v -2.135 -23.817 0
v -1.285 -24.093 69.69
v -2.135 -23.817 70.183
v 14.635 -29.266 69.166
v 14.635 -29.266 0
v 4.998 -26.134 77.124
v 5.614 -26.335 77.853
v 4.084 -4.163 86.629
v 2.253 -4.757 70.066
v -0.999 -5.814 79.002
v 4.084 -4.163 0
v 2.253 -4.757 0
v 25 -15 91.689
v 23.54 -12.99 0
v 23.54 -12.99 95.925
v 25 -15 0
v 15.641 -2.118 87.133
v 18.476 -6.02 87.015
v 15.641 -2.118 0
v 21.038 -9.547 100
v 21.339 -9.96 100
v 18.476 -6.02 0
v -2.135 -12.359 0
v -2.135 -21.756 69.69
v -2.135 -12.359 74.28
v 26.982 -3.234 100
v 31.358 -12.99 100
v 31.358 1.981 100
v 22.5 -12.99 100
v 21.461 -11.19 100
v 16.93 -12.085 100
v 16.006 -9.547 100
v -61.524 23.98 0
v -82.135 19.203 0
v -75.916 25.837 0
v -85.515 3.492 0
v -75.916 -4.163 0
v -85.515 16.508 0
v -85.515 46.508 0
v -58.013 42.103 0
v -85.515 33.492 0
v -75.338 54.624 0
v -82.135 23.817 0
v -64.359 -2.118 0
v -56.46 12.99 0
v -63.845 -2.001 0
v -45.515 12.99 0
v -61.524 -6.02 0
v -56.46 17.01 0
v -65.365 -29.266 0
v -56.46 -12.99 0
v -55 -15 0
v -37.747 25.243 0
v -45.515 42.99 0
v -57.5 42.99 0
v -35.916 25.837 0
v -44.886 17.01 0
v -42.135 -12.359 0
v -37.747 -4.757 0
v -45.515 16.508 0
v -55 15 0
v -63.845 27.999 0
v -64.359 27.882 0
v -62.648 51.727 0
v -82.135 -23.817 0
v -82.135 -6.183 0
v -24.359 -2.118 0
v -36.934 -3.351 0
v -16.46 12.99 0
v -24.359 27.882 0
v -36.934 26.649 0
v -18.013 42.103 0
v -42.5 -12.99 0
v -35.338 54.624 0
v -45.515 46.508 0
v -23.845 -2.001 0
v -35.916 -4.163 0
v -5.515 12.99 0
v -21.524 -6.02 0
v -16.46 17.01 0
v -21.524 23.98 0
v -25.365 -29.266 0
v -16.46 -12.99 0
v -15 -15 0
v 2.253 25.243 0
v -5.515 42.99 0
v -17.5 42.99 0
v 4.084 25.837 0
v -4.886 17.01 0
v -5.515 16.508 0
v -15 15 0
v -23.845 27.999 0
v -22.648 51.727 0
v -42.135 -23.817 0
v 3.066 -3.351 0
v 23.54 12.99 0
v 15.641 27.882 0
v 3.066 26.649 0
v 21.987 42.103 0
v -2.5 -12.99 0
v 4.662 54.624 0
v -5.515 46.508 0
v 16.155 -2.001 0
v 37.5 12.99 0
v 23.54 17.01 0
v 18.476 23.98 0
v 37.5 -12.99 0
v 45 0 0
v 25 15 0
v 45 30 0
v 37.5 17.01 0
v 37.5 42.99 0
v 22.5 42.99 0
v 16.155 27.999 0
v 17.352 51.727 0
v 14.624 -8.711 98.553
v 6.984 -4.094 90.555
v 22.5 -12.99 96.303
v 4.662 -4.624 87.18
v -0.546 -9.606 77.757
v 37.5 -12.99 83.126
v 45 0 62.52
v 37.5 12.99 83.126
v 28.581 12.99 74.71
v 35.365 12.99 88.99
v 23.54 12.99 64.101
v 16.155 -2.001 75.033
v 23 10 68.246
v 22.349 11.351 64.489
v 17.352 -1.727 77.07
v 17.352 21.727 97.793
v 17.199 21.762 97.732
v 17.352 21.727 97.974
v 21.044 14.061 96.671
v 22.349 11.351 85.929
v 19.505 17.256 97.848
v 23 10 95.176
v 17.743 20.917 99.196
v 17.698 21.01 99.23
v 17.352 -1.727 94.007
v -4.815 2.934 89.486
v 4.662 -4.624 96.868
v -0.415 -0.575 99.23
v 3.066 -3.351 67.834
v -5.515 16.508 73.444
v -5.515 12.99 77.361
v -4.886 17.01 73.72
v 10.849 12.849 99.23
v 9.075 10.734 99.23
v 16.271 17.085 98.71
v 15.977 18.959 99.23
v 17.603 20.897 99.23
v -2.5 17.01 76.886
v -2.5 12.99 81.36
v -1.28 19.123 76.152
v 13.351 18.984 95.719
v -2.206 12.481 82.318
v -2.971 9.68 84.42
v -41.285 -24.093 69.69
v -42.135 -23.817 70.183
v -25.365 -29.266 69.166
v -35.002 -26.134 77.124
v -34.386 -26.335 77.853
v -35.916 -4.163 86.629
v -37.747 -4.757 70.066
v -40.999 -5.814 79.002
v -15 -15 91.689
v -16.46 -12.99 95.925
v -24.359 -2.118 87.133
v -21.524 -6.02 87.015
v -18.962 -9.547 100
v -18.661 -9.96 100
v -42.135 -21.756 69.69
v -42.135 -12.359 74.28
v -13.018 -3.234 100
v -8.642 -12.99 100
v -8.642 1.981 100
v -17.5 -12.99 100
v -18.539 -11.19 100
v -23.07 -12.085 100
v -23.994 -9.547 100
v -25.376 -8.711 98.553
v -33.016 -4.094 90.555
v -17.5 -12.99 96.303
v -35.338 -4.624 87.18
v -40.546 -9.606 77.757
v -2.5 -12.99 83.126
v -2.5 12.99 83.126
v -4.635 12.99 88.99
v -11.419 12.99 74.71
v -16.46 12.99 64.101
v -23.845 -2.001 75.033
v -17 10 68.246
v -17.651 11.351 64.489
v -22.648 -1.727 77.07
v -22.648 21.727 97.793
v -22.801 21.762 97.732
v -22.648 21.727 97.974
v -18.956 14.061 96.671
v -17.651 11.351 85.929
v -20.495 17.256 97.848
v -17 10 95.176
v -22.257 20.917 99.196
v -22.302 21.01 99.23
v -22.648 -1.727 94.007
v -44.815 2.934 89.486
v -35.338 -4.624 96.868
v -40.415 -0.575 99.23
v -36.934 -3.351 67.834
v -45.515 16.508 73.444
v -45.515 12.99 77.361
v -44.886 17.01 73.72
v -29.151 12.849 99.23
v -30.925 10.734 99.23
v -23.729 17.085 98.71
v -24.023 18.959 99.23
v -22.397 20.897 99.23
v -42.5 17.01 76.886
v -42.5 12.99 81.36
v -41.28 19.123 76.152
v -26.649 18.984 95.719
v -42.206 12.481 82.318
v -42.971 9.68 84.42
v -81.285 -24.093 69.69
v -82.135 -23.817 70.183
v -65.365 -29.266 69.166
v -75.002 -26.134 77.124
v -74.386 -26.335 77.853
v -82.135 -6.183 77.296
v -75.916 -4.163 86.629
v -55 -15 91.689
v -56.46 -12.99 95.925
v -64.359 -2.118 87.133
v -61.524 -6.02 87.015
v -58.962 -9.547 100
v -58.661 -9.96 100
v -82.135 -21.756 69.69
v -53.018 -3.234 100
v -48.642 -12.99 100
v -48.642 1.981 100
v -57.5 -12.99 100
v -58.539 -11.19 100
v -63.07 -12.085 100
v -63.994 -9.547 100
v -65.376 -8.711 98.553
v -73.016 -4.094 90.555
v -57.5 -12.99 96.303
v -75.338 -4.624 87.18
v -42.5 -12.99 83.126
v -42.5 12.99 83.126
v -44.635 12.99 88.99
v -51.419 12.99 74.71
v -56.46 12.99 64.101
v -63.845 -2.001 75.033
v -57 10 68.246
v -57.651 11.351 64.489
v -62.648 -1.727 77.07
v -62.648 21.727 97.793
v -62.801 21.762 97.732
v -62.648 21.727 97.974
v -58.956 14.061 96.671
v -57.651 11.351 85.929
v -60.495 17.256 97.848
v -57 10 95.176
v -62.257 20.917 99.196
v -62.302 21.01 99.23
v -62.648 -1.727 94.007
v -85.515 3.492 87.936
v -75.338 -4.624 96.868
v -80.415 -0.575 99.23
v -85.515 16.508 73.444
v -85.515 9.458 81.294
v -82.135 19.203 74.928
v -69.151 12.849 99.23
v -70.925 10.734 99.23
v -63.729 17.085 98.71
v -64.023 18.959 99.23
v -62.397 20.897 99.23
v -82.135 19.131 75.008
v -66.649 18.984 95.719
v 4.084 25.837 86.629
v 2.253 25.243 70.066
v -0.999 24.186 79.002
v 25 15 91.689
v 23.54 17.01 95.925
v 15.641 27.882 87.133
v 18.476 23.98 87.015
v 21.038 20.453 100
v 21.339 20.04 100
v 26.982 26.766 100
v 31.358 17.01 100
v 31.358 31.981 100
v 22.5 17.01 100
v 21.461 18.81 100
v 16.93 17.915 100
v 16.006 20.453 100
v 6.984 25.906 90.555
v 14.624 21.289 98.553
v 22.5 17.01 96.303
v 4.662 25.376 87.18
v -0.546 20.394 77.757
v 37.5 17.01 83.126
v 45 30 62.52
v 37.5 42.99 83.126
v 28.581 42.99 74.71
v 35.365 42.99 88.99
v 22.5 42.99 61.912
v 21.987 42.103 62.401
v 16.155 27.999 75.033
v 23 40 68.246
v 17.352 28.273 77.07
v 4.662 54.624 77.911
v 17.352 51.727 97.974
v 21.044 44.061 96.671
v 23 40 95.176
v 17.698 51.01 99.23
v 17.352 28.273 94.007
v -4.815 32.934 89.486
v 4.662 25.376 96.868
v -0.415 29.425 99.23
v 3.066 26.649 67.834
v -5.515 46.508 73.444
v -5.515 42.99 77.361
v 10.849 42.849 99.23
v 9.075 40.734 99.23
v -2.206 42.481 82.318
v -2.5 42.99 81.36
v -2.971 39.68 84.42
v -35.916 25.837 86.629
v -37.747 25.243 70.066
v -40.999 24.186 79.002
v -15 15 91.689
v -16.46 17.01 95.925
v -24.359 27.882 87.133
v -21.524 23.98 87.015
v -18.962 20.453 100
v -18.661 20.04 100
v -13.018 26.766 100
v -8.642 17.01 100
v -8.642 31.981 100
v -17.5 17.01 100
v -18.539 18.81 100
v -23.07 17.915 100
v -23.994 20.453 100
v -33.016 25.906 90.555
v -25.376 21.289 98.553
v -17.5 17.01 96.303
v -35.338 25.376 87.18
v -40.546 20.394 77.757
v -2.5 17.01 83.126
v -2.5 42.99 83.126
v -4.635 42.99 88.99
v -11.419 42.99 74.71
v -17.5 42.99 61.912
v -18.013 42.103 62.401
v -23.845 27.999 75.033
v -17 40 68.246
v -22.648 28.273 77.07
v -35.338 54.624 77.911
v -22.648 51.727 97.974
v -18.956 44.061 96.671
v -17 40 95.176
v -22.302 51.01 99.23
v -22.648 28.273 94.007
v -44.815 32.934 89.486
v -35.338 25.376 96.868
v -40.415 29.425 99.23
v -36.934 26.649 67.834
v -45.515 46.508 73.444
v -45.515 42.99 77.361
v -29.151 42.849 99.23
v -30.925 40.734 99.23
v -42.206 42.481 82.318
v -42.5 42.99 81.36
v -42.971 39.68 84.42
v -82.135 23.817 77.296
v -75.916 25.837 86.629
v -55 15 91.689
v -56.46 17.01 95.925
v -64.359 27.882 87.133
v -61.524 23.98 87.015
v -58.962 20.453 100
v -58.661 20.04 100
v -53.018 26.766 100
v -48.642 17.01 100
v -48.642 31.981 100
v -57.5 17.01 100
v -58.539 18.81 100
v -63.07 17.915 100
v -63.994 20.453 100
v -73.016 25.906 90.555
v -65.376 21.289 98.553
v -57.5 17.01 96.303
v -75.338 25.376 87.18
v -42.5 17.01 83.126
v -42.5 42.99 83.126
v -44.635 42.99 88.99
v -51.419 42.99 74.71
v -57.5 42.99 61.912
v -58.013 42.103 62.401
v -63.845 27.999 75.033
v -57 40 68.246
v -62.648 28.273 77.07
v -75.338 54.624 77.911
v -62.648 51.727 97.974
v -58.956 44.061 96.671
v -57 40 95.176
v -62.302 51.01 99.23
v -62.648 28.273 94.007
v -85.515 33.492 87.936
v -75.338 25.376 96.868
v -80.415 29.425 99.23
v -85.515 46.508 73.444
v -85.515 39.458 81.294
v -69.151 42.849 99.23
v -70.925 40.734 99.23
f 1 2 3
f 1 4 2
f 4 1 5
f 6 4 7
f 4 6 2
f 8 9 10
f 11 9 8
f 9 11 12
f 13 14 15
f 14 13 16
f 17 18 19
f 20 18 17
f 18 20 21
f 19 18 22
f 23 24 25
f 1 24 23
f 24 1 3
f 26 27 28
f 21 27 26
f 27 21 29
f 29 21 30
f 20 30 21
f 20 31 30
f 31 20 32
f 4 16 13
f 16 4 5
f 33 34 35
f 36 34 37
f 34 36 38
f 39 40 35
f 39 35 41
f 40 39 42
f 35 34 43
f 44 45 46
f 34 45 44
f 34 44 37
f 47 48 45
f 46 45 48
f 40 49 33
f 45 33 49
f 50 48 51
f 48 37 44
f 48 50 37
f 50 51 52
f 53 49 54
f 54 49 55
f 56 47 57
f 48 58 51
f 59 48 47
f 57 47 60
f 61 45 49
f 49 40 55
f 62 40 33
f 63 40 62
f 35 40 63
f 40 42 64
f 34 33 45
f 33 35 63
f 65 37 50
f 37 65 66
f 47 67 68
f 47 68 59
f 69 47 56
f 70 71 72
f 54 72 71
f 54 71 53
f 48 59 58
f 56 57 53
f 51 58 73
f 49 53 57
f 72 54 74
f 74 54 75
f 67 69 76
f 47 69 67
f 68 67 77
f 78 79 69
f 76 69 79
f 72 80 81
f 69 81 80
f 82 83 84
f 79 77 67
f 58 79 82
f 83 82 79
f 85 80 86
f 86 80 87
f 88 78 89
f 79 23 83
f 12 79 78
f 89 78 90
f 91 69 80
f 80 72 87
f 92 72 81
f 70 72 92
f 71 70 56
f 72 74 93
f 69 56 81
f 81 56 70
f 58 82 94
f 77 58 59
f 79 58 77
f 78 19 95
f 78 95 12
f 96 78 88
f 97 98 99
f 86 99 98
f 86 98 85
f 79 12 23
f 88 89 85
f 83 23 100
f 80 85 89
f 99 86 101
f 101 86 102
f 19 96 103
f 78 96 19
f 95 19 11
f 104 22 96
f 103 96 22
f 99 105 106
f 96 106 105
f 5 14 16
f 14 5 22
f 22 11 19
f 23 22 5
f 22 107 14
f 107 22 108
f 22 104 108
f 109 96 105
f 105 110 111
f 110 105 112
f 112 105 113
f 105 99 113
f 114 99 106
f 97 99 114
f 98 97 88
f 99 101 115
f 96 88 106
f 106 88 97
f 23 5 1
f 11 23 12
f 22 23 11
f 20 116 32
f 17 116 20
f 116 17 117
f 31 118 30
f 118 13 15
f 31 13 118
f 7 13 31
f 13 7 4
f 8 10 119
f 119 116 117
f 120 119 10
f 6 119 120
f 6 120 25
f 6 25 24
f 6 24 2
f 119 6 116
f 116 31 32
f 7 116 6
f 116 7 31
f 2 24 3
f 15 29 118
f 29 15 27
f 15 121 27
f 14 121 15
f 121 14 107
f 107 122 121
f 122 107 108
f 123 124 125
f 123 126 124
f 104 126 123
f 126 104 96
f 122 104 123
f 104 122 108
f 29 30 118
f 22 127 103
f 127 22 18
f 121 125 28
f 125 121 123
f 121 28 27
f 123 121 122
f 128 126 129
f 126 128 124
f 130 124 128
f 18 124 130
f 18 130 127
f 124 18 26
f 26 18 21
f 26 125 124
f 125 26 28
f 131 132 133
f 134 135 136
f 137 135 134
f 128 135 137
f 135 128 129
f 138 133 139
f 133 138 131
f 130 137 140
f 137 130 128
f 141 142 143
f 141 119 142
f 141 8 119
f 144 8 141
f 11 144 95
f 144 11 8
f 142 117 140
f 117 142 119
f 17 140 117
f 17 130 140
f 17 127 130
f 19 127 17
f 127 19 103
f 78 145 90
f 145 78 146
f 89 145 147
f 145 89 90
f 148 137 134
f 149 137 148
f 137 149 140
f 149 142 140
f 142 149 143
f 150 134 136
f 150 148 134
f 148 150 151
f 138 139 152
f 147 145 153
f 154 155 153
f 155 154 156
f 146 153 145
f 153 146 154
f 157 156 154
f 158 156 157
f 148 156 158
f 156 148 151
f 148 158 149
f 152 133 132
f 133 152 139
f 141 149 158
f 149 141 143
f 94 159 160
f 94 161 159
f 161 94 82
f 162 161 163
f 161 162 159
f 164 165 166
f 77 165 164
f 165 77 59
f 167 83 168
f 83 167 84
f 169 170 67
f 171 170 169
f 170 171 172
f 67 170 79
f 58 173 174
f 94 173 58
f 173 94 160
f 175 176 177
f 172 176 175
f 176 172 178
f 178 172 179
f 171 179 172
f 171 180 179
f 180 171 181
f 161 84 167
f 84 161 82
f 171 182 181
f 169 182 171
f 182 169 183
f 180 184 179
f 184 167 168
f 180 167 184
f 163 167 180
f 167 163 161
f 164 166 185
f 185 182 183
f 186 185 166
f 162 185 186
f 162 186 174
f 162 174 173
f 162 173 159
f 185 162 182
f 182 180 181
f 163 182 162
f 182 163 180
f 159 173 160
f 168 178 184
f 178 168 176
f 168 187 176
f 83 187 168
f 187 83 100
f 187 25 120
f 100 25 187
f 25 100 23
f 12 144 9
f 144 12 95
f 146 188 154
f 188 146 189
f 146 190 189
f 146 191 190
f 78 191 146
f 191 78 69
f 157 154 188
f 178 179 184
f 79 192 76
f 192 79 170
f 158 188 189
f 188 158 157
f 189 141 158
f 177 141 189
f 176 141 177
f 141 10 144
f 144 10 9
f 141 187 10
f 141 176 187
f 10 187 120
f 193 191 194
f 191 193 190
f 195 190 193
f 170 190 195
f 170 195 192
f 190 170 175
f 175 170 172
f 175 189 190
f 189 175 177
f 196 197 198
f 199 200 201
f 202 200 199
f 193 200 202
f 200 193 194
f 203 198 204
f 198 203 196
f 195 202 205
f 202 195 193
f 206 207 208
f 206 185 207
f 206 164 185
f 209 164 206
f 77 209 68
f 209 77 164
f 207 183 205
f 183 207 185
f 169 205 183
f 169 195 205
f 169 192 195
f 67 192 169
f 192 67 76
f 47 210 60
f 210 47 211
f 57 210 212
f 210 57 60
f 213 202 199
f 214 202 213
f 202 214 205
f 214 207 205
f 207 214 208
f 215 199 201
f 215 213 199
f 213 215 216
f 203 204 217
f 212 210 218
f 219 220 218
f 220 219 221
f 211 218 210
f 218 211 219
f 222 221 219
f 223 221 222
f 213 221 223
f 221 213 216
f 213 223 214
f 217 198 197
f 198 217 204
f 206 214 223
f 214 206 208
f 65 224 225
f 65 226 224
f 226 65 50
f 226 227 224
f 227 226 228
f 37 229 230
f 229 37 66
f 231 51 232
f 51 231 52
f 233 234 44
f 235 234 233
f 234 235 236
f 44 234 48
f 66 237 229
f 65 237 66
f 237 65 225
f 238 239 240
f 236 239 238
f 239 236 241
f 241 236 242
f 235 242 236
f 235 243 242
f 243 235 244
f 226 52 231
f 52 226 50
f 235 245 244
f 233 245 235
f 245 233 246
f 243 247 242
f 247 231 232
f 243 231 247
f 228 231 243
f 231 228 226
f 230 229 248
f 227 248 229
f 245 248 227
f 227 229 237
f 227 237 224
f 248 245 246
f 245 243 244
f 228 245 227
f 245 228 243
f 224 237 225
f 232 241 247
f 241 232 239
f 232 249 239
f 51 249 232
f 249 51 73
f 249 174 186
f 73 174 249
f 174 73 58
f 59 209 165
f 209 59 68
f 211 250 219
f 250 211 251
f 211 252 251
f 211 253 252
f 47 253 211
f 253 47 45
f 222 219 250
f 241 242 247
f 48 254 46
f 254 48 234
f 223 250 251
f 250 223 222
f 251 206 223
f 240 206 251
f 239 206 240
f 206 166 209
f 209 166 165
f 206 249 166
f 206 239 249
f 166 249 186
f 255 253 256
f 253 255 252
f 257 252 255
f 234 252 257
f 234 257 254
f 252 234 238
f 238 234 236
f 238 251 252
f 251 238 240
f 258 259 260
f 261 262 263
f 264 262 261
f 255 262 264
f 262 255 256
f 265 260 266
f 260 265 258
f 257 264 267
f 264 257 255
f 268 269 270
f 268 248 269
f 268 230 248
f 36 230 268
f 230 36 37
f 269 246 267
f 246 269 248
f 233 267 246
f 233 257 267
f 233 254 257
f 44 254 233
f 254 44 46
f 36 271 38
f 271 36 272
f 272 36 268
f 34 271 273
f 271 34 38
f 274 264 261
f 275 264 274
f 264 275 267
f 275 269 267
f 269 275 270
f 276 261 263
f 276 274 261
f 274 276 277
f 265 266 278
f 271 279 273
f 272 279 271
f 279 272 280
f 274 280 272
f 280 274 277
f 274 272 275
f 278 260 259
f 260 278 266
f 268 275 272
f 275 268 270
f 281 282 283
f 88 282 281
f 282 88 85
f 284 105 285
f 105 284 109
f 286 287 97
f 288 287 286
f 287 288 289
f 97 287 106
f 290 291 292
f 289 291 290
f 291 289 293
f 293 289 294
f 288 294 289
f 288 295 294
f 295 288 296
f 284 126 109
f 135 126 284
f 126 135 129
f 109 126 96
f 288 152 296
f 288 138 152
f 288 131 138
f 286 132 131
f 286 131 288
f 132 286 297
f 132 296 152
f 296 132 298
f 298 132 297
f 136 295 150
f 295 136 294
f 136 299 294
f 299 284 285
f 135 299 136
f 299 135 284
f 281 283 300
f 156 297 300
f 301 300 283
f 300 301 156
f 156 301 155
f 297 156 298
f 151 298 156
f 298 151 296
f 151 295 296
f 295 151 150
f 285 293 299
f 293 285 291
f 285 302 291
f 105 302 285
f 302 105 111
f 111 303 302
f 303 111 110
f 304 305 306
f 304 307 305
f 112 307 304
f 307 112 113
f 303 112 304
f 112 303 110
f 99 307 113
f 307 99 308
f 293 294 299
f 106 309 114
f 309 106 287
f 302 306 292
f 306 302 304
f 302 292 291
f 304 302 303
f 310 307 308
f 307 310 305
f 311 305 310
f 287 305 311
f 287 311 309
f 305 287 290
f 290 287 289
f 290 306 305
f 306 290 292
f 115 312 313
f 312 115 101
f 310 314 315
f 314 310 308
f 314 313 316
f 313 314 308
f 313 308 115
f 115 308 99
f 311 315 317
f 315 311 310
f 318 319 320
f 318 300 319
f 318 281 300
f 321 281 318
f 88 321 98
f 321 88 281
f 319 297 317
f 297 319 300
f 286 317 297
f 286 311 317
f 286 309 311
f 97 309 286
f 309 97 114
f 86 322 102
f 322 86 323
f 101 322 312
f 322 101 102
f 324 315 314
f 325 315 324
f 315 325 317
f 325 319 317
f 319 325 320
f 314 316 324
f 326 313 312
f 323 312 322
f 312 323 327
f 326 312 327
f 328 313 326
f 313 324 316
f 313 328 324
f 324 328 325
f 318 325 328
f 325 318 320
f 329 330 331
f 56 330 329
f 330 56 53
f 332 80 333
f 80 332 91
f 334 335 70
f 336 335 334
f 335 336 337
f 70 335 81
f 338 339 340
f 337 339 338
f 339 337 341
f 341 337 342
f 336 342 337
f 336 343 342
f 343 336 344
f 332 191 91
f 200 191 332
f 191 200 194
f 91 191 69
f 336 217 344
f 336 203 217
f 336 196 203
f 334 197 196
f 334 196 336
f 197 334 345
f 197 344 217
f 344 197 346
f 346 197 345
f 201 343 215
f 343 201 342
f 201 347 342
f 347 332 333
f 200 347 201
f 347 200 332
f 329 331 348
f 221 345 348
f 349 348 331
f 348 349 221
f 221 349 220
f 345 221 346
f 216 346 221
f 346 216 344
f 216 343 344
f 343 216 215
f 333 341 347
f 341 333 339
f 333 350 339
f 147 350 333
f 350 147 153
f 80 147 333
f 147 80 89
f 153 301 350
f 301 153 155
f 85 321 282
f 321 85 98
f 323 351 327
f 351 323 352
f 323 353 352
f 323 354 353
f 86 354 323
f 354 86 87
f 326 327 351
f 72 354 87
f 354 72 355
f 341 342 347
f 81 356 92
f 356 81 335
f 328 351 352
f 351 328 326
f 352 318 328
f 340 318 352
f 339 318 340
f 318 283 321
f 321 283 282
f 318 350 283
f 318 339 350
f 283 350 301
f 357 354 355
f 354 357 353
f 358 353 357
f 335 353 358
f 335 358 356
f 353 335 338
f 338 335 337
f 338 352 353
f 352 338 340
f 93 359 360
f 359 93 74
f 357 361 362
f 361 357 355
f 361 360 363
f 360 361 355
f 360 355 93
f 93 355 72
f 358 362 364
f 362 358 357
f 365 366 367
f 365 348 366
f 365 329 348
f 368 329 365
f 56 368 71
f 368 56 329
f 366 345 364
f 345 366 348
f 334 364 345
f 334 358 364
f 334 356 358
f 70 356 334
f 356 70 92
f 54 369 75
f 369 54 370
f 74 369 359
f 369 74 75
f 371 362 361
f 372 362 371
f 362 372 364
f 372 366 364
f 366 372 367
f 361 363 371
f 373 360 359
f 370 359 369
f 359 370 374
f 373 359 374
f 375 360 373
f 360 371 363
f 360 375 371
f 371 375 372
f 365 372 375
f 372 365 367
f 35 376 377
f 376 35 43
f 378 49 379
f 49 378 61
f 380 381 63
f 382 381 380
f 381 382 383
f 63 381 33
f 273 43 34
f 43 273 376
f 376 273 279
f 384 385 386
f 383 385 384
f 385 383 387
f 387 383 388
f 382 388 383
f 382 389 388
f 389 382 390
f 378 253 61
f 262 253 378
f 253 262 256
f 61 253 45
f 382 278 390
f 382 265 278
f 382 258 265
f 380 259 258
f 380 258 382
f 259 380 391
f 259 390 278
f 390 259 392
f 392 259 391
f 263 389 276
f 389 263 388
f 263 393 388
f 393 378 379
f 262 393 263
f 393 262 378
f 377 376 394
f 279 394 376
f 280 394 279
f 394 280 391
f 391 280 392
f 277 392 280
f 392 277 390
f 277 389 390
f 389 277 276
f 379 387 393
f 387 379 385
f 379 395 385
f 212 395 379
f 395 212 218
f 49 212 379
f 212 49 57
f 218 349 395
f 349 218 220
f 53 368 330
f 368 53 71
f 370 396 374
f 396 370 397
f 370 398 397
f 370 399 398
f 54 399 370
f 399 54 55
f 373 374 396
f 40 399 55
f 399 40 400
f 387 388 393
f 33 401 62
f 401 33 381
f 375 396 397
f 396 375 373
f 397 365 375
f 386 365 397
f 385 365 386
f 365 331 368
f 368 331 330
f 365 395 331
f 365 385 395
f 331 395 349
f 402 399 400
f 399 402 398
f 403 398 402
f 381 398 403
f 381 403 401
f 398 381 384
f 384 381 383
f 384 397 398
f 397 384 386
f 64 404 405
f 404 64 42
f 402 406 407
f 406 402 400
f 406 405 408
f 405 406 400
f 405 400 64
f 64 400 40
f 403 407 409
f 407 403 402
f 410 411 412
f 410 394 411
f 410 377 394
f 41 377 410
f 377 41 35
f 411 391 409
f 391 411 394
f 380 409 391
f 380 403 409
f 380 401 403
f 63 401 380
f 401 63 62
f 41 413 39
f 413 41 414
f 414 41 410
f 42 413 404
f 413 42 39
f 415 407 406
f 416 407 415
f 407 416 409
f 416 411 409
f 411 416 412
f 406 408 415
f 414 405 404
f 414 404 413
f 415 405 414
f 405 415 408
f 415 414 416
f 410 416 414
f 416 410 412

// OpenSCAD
XRAD = 15;

module xtal(){
    translate([10, -15, 0]){
        difference(){
            cylinder(h = 100, r = XRAD, $fn=5);
            translate([0, 17, 100]){
                rotate([30, 0, 0]){
                    cube([30, 20, 30], center=true);
                }
            }
            translate([0, -10, 100]){
                rotate([-30, 20, 0]){
                    cube([40, 20, 55], center=true);
                }
            }
            translate([-5, 0, 100]){
                rotate([0, 35, 20]){
                    cube([20, 30, 60], center=true);
                }
            }
        }
    }
    translate([XRAD*2, 0, 0]){
        difference(){
            cylinder(h = 100, r = XRAD, $fn=6);
            translate([12, 0, 100]){
                rotate([0, -20, 0]){
                    cube([20, 40, 80], center=true);
                }
            }
            translate([-10, 5, 100]){
                rotate([0, 20, -40]){
                    cube([20, 40, 80], center=true);
                }
            }
        }
    }
    translate([8, -20, 0]){
        translate([0, XRAD*2, 0]){
            difference(){
                cylinder(h = 100, r = XRAD, $fn=7);
                translate([0, 0, 110]){
                    rotate([0, 20, -40]){
                        cube([40, 40, 20], center=true);
                    }
                }
                translate([-9, 6, 100]){
                    rotate([0, 30, -40]){
                        cube([20, 40, 80], center=true);
                    }
                }
            }
        }
    }
}

translate([0, 0, 0]){
    xtal();
}
translate([-40, 0, 0]){
    xtal();
}
translate([-80, 0, 0]){
    xtal();
}

translate([0, 30, 0]){
    xtal();
}
translate([-40, 30, 0]){
    xtal();
}
translate([-80, 30, 0]){
    xtal();
}
